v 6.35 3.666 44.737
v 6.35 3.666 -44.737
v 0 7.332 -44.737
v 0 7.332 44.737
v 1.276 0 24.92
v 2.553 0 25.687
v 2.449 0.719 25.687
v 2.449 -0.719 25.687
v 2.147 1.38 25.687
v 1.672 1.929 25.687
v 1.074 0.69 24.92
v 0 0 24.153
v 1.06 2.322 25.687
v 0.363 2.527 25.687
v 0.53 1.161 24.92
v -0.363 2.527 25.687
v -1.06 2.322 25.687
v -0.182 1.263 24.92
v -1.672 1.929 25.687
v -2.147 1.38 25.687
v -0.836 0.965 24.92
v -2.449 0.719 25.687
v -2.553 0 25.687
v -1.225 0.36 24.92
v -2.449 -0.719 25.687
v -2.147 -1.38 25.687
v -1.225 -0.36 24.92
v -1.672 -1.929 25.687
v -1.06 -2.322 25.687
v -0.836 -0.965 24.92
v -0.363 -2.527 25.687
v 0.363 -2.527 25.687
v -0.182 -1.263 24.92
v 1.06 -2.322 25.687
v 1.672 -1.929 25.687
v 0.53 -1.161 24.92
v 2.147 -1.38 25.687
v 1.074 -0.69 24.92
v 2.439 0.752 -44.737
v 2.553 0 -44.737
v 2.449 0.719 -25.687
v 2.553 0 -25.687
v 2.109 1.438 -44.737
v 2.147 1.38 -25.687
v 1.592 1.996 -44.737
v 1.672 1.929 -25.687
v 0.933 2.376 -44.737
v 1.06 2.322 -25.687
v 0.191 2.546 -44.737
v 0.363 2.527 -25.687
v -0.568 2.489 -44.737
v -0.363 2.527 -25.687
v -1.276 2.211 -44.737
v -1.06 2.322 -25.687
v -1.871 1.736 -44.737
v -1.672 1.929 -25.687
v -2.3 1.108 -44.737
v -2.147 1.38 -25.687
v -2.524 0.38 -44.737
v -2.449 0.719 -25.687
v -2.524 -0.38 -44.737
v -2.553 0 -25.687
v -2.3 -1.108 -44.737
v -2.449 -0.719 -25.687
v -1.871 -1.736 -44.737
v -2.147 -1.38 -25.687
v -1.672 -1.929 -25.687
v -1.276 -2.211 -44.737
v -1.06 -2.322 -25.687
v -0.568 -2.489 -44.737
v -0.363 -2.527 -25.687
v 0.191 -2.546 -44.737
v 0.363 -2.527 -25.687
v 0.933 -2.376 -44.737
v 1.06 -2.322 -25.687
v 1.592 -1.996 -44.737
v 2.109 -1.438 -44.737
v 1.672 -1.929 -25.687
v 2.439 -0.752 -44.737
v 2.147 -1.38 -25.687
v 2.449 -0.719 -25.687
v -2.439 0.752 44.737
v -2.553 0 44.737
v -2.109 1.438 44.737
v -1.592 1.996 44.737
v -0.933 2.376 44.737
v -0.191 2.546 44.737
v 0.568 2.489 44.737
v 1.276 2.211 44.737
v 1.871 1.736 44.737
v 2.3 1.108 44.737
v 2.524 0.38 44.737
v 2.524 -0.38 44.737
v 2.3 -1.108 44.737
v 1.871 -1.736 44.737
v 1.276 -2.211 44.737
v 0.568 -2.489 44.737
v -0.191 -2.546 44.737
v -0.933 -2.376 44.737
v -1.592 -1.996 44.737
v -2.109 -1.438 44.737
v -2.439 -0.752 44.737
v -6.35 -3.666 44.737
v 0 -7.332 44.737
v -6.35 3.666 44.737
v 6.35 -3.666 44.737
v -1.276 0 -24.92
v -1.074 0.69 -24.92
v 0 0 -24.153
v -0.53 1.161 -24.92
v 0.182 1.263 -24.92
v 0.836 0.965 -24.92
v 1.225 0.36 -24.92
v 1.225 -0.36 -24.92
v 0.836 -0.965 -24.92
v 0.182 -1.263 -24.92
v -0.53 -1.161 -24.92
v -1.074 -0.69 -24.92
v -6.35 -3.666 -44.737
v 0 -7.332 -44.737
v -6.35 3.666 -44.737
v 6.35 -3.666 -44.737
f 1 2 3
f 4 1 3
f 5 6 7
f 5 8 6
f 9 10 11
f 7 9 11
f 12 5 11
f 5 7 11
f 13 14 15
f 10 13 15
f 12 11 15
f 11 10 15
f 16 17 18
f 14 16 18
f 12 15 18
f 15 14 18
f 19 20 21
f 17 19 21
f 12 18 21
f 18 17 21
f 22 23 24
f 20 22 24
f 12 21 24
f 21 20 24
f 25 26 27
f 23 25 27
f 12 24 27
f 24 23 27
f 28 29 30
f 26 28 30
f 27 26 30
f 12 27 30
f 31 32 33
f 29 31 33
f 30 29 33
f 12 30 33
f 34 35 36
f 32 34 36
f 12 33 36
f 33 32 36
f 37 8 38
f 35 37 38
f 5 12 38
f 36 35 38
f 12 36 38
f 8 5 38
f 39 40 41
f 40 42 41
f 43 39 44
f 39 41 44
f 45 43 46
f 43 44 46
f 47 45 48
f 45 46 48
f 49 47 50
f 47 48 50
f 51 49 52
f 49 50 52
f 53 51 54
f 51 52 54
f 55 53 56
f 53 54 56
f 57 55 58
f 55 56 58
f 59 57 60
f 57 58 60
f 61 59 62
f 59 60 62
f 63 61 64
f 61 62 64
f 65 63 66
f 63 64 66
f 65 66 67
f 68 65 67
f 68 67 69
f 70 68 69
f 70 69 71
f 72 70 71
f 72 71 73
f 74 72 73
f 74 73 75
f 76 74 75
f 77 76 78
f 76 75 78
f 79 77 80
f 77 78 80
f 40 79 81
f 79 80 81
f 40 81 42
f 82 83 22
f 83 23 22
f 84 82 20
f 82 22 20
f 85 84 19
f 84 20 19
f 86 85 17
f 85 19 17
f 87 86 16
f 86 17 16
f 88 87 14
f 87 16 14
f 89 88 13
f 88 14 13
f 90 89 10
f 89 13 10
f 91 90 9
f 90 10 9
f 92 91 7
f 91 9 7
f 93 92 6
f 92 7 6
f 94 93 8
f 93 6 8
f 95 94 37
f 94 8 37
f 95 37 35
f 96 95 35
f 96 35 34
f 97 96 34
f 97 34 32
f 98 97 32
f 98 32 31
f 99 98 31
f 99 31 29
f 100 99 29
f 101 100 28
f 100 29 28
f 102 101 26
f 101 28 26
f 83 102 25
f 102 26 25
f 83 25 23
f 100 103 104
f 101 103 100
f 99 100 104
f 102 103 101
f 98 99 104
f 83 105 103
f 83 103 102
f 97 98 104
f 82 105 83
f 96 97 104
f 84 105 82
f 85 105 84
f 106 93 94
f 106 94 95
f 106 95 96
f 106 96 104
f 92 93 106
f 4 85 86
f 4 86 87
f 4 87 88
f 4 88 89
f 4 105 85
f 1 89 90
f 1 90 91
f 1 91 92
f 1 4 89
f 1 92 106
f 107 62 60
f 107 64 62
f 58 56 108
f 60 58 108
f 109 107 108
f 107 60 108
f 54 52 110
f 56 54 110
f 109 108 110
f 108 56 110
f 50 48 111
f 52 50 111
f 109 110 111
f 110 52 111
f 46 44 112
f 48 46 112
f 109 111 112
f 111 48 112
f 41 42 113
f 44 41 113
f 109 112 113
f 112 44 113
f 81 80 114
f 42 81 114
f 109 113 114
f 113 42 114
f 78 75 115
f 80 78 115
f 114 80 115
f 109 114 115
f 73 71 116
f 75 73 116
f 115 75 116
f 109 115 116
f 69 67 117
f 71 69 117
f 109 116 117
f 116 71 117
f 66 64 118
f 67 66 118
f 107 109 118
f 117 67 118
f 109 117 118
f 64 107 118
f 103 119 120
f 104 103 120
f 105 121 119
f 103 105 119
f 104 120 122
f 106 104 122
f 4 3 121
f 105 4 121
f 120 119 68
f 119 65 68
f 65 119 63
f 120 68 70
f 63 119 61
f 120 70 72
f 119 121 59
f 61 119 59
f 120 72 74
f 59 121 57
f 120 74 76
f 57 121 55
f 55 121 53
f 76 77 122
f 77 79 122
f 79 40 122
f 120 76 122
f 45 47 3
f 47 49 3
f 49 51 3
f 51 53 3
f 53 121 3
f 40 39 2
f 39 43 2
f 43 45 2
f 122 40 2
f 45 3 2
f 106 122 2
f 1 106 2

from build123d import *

# Parameters (mm, degrees)
BOSS_EXTRUDE1_DEPTH             = 44.73702
BOSS_EXTRUDE1_DEPTH_BACK        = 44.73702
TAP_DRILL_FOR_1_4_20_TAP1_D     = 5.1054
TAP_DRILL_FOR_1_4_20_TAP1_DEPTH = 19.05
TAP_DRILL_FOR_1_4_20_TAP1_TIP   = 1.533816902
TAP_DRILL_FOR_1_4_20_TAP2_D     = 5.1054
TAP_DRILL_FOR_1_4_20_TAP2_DEPTH = 19.05
TAP_DRILL_FOR_1_4_20_TAP2_TIP   = 1.533816902


with BuildPart() as part:
    # Sketch3 → Boss-Extrude1 (new, two sides: drawn at the far end of the back side and taken through both)
    with BuildSketch(Plane.XY.offset(-BOSS_EXTRUDE1_DEPTH_BACK)):
        Polygon((0, 7.332348419), (-6.35, 3.666174209), (-6.35, -3.666174209), (0, -7.332348419), (6.35, -3.666174209), (6.35, 3.666174209), align=None)
    extrude(amount=BOSS_EXTRUDE1_DEPTH + BOSS_EXTRUDE1_DEPTH_BACK)

    # Tap Drill for 1/4-20 Tap1
    with Locations(Plane(origin=(0, 0, -44.73702), x_dir=(-1, 0, 0), z_dir=(0, 0, -1))):
        with Locations((0, 0)):
            Hole(TAP_DRILL_FOR_1_4_20_TAP1_D / 2, depth=TAP_DRILL_FOR_1_4_20_TAP1_DEPTH)
            with Locations((0, 0, -(TAP_DRILL_FOR_1_4_20_TAP1_DEPTH + TAP_DRILL_FOR_1_4_20_TAP1_TIP / 2))):  # 118° drill point
                Cone(0, TAP_DRILL_FOR_1_4_20_TAP1_D / 2, TAP_DRILL_FOR_1_4_20_TAP1_TIP, mode=Mode.SUBTRACT)

    # Tap Drill for 1/4-20 Tap2
    with Locations(Plane.XY.offset(44.73702)):
        with Locations((0, 0)):
            Hole(TAP_DRILL_FOR_1_4_20_TAP2_D / 2, depth=TAP_DRILL_FOR_1_4_20_TAP2_DEPTH)
            with Locations((0, 0, -(TAP_DRILL_FOR_1_4_20_TAP2_DEPTH + TAP_DRILL_FOR_1_4_20_TAP2_TIP / 2))):  # 118° drill point
                Cone(0, TAP_DRILL_FOR_1_4_20_TAP2_D / 2, TAP_DRILL_FOR_1_4_20_TAP2_TIP, mode=Mode.SUBTRACT)


solid = part.part
